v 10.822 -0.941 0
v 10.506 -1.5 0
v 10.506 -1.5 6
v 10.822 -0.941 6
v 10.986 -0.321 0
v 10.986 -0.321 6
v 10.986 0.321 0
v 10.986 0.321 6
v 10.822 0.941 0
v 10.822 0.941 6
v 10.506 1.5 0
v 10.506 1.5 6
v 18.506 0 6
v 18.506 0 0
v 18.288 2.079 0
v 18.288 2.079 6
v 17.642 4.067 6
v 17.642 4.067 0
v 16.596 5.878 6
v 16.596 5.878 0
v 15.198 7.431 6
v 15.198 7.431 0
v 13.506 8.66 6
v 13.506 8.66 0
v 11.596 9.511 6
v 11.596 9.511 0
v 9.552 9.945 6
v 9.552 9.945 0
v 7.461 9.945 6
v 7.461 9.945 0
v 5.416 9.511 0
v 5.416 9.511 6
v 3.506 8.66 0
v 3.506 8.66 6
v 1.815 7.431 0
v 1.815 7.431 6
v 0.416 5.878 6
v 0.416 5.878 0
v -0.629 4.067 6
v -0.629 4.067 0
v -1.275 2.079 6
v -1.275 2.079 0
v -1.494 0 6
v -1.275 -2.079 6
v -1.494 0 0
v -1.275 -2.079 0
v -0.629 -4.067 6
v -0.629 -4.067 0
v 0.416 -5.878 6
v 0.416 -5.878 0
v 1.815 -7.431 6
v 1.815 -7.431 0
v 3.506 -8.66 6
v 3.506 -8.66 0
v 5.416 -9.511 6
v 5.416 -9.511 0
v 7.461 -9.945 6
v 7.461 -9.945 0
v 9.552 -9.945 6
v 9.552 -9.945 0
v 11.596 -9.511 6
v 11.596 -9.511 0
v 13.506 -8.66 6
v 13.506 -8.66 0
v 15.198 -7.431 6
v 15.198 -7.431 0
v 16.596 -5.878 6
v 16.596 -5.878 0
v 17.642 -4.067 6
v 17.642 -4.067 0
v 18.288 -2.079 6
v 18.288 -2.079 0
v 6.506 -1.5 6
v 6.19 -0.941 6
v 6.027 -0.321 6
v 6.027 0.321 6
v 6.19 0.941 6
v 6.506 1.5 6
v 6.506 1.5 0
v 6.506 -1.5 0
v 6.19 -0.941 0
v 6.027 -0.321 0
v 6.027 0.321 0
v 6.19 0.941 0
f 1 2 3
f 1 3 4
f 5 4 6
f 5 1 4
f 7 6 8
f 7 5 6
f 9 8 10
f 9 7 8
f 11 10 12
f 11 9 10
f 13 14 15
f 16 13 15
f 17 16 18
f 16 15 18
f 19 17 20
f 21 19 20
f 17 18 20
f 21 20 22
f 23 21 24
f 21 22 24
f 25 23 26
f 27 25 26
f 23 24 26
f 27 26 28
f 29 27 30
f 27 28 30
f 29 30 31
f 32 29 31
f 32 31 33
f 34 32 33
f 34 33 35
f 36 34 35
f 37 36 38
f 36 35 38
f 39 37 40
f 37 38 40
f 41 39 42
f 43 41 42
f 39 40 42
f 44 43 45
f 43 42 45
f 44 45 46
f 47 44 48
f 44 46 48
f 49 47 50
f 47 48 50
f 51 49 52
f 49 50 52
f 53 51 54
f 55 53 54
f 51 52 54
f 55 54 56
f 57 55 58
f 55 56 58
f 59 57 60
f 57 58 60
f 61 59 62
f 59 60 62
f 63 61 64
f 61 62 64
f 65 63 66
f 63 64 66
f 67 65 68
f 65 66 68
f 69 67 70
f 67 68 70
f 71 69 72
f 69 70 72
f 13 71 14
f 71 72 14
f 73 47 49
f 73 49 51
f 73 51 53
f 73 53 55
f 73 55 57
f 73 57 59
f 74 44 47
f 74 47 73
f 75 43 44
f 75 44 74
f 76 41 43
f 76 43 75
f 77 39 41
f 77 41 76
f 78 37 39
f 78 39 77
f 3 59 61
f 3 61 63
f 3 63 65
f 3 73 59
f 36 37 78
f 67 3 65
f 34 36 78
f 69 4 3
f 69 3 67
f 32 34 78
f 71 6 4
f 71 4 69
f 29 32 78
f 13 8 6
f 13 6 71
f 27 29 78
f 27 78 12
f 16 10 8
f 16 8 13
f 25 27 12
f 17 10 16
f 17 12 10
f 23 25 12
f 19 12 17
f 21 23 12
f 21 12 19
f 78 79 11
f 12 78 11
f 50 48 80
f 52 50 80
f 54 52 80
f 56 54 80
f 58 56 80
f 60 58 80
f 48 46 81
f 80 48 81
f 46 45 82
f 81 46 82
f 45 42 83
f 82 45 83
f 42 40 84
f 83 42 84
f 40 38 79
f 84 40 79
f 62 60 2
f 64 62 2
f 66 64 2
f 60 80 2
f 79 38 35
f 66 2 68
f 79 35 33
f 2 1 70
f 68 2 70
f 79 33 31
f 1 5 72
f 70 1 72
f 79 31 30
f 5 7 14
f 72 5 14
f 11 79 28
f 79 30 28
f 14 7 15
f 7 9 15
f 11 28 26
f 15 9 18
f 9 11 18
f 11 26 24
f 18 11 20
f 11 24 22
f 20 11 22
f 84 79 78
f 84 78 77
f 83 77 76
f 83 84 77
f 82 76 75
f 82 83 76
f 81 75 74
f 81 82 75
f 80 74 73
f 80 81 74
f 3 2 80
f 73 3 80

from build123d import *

# Parameters (mm, degrees)
SKETCH1_R           = 10
SKETCH1_R_2         = 2.5
BOSS_EXTRUDE1_DEPTH = 6


with BuildPart() as part:
    # Sketch1 → Boss-Extrude1 (new body)
    # profile 1 of 3: a face of its own
    with BuildSketch(Plane(origin=(0, 0, 0), x_dir=(-1, 0, 0), z_dir=(0, 0, 1))):
        with Locations(Location((-8.506234752, 0, 0), (0, 0, 180))):
            Circle(SKETCH1_R)
        with Locations((-8.506234752, 0)):
            Circle(SKETCH1_R_2, mode=Mode.SUBTRACT)
    # profile 2 of 3: a face of its own
    with BuildSketch(Plane(origin=(0, 0, 0), x_dir=(-1, 0, 0), z_dir=(0, 0, 1))):
        with BuildLine():
            Line((-6.506234752, -1.5), (-10.506234752, -1.5))
            ThreePointArc((-10.506234752, -1.5), (-8.506234752, -2.5), (-6.506234752, -1.5))
        make_face()
    # profile 3 of 3: a face of its own
    with BuildSketch(Plane(origin=(0, 0, 0), x_dir=(-1, 0, 0), z_dir=(0, 0, 1))):
        with BuildLine():
            ThreePointArc((-6.506234752, 1.5), (-8.506234752, 2.5), (-10.506234752, 1.5))
            Line((-10.506234752, 1.5), (-6.506234752, 1.5))
        make_face()
    extrude(amount=BOSS_EXTRUDE1_DEPTH)


solid = part.part
